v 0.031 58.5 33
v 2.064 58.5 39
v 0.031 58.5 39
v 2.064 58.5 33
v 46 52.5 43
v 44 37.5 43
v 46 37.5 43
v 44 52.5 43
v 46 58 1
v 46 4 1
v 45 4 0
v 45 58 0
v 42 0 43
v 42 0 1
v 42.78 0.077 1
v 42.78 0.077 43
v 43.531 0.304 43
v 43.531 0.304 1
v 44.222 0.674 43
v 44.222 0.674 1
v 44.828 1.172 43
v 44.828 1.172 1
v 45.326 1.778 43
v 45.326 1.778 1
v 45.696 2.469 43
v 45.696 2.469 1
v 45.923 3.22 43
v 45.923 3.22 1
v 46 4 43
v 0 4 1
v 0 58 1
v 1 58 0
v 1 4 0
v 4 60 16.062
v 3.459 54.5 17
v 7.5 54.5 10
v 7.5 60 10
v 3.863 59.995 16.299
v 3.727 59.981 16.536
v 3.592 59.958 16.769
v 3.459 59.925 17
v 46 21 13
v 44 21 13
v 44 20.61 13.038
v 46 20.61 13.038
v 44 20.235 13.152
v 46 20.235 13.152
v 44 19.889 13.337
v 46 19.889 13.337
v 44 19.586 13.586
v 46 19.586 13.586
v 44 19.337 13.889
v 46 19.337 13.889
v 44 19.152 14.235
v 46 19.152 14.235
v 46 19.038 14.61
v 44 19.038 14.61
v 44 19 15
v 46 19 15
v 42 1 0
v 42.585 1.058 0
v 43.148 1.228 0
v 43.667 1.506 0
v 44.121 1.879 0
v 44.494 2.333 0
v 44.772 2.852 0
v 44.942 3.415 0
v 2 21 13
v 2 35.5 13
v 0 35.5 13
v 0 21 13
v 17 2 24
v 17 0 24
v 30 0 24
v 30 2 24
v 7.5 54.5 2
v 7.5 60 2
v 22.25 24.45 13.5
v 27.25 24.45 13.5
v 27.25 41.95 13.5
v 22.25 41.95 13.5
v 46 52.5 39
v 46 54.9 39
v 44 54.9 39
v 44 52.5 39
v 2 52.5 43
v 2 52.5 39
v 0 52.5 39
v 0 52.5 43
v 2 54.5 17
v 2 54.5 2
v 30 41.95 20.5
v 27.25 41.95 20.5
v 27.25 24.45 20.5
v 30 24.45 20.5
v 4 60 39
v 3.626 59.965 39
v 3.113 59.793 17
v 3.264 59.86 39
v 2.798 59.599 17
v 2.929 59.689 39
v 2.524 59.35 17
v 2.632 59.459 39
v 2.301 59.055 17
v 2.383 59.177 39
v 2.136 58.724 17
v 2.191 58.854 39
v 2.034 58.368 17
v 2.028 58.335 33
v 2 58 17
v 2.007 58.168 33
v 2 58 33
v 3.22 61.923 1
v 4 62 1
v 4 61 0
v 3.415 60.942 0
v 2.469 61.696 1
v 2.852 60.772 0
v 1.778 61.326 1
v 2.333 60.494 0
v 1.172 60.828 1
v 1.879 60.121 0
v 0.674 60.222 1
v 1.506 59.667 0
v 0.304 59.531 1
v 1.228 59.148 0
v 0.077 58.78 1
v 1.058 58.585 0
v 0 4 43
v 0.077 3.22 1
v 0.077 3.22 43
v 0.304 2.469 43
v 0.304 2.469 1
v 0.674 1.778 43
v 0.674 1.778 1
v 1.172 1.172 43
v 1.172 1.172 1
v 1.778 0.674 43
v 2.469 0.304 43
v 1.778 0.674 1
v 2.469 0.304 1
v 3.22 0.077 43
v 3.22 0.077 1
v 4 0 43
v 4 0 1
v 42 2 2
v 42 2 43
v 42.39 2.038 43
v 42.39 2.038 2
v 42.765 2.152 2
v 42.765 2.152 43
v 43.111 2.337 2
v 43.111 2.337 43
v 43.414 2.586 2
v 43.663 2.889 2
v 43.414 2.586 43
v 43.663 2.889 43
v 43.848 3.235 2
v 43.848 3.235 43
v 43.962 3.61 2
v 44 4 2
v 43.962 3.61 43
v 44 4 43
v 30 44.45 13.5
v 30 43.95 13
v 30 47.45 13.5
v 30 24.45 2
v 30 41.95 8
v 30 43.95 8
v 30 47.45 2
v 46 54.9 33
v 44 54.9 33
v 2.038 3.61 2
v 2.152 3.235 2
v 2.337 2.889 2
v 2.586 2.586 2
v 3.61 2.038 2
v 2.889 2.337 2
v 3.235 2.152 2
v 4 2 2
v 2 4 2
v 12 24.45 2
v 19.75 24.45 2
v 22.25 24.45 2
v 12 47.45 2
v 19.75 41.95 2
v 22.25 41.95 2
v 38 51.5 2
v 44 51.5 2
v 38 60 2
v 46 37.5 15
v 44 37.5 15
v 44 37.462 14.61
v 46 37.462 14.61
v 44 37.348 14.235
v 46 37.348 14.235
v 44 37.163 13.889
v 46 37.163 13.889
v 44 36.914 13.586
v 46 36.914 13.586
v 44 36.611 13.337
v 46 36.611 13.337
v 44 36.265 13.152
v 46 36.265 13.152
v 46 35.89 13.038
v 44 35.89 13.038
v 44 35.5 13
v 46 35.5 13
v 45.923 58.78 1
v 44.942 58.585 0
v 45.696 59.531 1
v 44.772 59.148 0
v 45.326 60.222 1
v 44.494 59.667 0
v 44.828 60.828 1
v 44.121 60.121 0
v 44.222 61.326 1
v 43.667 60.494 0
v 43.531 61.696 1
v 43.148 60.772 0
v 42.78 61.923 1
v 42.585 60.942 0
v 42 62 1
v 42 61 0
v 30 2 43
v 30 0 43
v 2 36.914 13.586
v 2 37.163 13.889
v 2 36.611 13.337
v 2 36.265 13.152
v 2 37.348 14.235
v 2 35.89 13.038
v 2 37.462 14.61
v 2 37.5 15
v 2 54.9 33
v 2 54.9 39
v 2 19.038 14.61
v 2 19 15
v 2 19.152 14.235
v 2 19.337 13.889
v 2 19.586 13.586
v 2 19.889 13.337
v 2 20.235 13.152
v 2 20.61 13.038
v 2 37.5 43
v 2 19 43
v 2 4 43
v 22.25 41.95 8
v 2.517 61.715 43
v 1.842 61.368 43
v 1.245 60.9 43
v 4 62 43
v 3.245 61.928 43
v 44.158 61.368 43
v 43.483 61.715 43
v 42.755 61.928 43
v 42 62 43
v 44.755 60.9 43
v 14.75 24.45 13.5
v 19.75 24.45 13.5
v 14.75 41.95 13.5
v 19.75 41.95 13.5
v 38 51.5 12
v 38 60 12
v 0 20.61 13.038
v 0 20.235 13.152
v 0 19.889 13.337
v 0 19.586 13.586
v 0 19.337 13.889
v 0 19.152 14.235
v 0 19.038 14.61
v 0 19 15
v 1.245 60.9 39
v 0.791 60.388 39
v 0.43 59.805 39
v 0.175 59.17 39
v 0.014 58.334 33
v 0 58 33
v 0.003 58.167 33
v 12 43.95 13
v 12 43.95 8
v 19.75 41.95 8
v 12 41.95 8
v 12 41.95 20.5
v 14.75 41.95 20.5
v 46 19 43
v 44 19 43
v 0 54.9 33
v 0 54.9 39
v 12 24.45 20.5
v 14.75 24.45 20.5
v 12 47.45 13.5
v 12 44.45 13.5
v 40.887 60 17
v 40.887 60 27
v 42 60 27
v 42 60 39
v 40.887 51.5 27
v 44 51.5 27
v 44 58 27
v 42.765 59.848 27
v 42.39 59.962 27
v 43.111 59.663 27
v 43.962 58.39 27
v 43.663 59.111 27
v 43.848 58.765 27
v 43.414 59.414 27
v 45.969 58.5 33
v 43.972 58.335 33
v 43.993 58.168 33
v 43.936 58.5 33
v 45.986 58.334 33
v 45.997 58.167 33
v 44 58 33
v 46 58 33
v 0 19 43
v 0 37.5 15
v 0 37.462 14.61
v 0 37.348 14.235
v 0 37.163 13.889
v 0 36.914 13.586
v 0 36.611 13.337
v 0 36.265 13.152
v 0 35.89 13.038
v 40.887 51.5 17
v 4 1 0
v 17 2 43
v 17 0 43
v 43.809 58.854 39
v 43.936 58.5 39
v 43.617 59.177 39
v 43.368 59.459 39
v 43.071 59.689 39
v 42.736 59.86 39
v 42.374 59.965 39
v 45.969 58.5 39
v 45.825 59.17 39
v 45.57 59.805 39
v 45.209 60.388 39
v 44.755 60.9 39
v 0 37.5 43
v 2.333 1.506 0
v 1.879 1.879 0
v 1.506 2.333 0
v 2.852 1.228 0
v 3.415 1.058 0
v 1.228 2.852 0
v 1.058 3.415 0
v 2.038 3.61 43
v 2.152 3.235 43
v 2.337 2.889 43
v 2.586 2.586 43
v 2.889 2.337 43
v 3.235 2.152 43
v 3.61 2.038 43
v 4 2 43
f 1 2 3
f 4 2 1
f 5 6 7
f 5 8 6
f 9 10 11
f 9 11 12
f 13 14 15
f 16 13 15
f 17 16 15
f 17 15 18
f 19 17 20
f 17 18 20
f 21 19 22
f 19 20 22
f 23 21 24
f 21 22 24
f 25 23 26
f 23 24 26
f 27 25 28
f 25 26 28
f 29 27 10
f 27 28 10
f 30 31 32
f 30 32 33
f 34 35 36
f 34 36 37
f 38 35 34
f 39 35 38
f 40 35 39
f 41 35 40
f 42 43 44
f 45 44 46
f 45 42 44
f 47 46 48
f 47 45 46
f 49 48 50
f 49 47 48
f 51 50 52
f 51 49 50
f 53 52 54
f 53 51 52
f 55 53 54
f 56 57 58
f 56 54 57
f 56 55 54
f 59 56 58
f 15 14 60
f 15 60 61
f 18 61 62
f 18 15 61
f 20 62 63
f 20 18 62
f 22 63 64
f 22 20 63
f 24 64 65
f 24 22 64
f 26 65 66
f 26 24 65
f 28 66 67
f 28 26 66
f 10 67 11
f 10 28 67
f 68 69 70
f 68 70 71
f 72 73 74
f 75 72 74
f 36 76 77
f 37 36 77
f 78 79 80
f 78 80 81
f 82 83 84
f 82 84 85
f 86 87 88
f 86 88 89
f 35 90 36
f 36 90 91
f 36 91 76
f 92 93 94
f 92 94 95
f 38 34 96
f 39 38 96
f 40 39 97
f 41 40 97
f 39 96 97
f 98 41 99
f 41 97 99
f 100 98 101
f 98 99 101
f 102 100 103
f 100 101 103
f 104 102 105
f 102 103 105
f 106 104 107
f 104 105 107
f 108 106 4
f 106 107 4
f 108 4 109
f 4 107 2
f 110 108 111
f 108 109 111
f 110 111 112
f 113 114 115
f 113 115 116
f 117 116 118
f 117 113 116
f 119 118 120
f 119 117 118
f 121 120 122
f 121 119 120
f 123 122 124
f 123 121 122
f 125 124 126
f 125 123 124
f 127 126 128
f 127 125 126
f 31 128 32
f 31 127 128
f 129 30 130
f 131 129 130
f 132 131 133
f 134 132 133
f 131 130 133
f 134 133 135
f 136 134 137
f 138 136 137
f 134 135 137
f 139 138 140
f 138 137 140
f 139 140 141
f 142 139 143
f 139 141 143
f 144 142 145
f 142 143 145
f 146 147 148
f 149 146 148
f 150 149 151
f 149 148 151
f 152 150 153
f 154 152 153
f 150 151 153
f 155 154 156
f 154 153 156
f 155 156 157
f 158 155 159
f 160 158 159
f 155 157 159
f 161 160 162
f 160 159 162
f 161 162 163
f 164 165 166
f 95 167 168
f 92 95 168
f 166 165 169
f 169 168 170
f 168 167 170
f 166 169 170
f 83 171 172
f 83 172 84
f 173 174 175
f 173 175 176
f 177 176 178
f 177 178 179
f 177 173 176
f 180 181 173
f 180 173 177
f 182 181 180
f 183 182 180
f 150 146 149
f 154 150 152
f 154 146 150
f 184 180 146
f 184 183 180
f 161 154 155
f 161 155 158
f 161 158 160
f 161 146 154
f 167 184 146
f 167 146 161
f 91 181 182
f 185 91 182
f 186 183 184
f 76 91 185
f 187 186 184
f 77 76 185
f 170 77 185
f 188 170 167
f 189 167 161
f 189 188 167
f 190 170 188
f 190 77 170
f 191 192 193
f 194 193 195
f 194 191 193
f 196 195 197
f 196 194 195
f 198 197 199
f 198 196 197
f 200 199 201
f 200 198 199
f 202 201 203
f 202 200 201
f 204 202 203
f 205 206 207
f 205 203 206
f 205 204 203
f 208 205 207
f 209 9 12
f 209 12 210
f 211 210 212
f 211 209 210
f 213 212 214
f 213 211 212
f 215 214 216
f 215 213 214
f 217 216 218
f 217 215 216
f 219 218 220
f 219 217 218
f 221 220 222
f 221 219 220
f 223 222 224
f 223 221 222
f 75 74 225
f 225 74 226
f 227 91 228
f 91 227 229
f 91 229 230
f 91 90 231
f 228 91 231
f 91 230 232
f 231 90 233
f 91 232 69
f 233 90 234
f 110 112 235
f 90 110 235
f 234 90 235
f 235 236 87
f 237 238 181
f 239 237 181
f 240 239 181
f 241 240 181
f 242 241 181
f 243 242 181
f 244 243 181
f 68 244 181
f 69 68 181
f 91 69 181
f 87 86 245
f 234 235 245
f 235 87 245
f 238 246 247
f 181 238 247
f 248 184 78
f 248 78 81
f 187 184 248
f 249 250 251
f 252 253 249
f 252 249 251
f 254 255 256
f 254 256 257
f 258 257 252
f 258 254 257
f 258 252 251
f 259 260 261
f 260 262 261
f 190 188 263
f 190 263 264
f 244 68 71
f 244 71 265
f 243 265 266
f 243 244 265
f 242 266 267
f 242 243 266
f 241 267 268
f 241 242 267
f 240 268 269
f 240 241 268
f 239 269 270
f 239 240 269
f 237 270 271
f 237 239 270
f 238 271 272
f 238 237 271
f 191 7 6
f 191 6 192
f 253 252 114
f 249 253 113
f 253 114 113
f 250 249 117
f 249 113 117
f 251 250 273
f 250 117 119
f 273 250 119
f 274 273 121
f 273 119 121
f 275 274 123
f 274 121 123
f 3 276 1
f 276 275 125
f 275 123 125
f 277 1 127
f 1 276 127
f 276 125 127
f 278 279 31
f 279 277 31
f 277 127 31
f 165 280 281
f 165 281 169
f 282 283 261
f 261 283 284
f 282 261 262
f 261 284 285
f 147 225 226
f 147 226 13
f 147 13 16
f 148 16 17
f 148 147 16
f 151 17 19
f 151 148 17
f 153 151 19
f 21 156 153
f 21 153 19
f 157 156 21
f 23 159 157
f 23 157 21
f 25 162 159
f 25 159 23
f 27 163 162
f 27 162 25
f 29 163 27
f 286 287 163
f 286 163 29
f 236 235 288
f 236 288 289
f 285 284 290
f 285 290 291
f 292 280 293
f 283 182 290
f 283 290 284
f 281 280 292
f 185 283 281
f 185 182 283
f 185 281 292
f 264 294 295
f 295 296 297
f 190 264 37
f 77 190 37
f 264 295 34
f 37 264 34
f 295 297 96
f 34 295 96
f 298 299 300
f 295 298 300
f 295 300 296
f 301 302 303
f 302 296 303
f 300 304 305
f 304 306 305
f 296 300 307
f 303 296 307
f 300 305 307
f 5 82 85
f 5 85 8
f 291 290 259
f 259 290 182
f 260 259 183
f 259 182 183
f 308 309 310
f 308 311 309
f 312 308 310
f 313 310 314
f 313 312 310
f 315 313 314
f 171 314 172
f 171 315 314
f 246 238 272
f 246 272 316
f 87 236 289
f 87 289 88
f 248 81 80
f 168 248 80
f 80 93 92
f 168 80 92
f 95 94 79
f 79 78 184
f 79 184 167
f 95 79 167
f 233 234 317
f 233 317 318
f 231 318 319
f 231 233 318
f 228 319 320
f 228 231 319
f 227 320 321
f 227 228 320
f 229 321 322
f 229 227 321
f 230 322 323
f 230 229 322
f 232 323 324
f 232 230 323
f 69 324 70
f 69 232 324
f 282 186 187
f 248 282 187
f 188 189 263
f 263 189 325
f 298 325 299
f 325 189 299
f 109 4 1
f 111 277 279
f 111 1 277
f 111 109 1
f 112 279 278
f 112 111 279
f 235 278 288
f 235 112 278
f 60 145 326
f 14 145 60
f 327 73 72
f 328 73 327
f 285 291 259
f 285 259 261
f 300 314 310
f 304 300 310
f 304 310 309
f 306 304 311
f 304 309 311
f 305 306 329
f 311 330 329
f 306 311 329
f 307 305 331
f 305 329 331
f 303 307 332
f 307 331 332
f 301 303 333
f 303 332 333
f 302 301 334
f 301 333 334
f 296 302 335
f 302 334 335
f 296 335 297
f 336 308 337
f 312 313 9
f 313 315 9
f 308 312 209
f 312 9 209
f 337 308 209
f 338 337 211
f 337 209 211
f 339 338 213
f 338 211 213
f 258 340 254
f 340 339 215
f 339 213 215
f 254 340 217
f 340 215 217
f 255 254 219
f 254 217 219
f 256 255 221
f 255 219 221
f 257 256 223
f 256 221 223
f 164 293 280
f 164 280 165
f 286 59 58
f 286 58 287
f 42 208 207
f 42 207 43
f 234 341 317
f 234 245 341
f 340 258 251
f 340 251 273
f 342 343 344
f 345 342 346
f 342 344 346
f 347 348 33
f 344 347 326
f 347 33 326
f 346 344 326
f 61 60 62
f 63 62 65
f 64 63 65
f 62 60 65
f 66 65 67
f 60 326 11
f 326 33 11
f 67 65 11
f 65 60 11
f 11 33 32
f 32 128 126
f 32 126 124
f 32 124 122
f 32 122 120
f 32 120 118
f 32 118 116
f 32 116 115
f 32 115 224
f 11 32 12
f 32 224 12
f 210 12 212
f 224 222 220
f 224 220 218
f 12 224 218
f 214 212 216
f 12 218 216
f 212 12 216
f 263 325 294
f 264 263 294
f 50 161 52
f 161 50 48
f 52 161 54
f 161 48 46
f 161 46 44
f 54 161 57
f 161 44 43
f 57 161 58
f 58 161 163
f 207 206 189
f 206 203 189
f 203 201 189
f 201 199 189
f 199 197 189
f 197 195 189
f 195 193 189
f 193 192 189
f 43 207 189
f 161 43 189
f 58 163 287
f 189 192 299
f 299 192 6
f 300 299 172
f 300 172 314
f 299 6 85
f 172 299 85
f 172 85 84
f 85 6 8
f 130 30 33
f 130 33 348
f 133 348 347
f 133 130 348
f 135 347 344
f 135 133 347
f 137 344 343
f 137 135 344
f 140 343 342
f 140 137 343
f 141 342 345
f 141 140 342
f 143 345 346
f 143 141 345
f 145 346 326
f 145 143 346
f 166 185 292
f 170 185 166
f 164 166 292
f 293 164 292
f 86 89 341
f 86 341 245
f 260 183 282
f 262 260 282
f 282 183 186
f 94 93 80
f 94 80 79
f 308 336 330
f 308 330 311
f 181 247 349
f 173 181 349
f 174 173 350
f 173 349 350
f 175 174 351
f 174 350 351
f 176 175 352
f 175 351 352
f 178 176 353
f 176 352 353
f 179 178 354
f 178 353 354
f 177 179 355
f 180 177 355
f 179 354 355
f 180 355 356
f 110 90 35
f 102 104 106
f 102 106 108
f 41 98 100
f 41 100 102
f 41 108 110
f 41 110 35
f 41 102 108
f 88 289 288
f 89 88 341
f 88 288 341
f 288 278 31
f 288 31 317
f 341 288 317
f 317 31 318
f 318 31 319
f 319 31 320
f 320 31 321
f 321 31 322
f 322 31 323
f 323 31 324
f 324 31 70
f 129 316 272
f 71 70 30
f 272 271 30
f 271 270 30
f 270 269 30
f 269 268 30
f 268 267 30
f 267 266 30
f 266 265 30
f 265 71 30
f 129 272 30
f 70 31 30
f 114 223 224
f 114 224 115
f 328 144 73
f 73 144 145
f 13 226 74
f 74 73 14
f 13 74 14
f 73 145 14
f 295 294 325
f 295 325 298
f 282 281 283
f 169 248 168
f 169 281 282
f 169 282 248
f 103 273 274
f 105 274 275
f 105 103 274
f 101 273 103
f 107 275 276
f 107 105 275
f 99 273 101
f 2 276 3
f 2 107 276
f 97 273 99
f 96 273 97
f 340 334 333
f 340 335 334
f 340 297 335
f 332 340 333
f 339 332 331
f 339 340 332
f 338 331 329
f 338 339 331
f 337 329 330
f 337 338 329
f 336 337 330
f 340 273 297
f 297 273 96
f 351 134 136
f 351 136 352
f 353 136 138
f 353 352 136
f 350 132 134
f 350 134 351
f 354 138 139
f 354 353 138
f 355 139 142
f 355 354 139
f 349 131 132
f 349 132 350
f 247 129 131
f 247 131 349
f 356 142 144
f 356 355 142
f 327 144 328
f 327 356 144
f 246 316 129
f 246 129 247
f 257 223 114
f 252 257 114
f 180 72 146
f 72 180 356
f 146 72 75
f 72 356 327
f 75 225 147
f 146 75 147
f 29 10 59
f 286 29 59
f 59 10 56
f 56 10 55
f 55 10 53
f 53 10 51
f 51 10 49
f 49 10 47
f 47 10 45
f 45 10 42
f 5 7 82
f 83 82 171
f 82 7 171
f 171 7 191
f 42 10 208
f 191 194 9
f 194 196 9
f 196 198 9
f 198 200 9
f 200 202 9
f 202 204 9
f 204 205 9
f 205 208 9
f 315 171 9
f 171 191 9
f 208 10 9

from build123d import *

# Parameters (mm, degrees)
BOSS_EXTRU_1_DEPTH      = 43
ENL_V_MAT_EXTRU_1_DEPTH = 41
ENL_V_MAT_EXTRU_2_DEPTH = 89.36854644
CHANFREIN1_SIZE         = 1
ENL_V_MAT_EXTRU_3_DEPTH = 89.36854644
ESQUISSE6_W             = 18
ESQUISSE6_H             = 23
BOSS_EXTRU_2_DEPTH      = 18.5
ENL_V_MAT_EXTRU_4_DEPTH = 7
ESQUISSE8_W             = 18
ESQUISSE8_H             = 2
ENL_V_MAT_EXTRU_5_DEPTH = 5.5
ESQUISSE9_W             = 13
ESQUISSE9_H             = 19
ENL_V_MAT_EXTRU_6_DEPTH = 3
CHANFREIN2_SIZE         = 0.5
ENL_V_START             = -11.5
ESQUISSE14_W            = 2.5
ESQUISSE14_H            = 17.5
ENL_V_MAT_EXTRU_7_DEPTH = 11.5
ESQUISSE15_W            = 5.5
ESQUISSE15_H            = 5.5
ESQUISSE15_W_2          = 6
ESQUISSE15_H_2          = 8.5
BOSS_EXTRU_4_DEPTH      = 15
CHANFREIN3_SIZE         = 7
CHANFREIN3_SIZE2        = 4.041451884
CHANFREIN4_SIZE         = 5
CHANFREIN4_SIZE2        = 2.886751346
ESQUISSE16_W            = 10
ESQUISSE16_H            = 8.5
BOSS_EXTRU_5_DEPTH      = 3.11325


with BuildPart() as part:
    # Esquisse1 → Boss.-Extru.1 (new body)
    with BuildSketch(Plane.XY):
        with BuildLine():
            Line((4, 0), (42, 0))
            ThreePointArc((42, 0), (44.828427125, 1.171572875), (46, 4))
            Line((46, 4), (46, 58))
            ThreePointArc((46, 58), (44.828427125, 60.828427125), (42, 62))
            Line((42, 62), (4, 62))
            ThreePointArc((4, 62), (1.171572875, 60.828427125), (0, 58))
            Line((0, 58), (0, 4))
            ThreePointArc((0, 4), (1.171572875, 1.171572875), (4, 0))
        make_face()
    extrude(amount=BOSS_EXTRU_1_DEPTH)

    # Esquisse3 → Enlèv. mat.-Extru.1 (cut)
    with BuildSketch(Plane.XY.offset(43)):
        with BuildLine():
            Line((2, 58), (2, 4))
            ThreePointArc((2, 4), (2.585786438, 2.585786438), (4, 2))
            Line((4, 2), (42, 2))
            ThreePointArc((42, 2), (43.414213562, 2.585786438), (44, 4))
            Line((44, 4), (44, 58))
            ThreePointArc((44, 58), (43.414213562, 59.414213562), (42, 60))
            Line((42, 60), (4, 60))
            ThreePointArc((4, 60), (2.585786438, 59.414213562), (2, 58))
        make_face()
    extrude(amount=-ENL_V_MAT_EXTRU_1_DEPTH, mode=Mode.SUBTRACT)

    # Esquisse4 → Enlèv. mat.-Extru.2 (cut, through all)
    with BuildSketch(Plane(origin=(46, 0, 0), x_dir=(0, 0, -1), z_dir=(1, 0, 0))):
        Polygon((-58.508519511, 60.9), (-39, 60.9), (-39, 58.5), (-33, 58.5), (-33, 54.9), (-39, 54.9), (-39, 52.5), (-58.508519511, 52.5), align=None)
    extrude(amount=-ENL_V_MAT_EXTRU_2_DEPTH, mode=Mode.SUBTRACT)

    # Chanfrein1
    chanfrein1_edges = [part.edges().sort_by_distance(p)[0] for p in [
        (46, 31, 0),
        (44.828427125, 1.171572875, 0),
        (23, 0, 0),
        (1.171572875, 1.171572875, 0),
        (0, 31, 0),
        (1.171572875, 60.828427125, 0),
        (23, 62, 0),
        (44.828427125, 60.828427125, 0),
    ]]
    chamfer(chanfrein1_edges, length=CHANFREIN1_SIZE)

    # Esquisse5 → Enlèv. mat.-Extru.3 (cut, through all)
    with BuildSketch(Plane(origin=(46, 0, 0), x_dir=(0, 0, -1), z_dir=(1, 0, 0))):
        with BuildLine():
            Line((-61.896917985, 37.5), (-15, 37.5))
            ThreePointArc((-15, 37.5), (-13.585786438, 36.914213562), (-13, 35.5))
            Line((-13, 35.5), (-13, 21))
            ThreePointArc((-13, 21), (-13.585786438, 19.585786438), (-15, 19))
            Line((-15, 19), (-61.896917985, 19))
            Line((-61.896917985, 19), (-61.896917985, 37.5))
        make_face()
    extrude(amount=-ENL_V_MAT_EXTRU_3_DEPTH, mode=Mode.SUBTRACT)

    # Esquisse6 → Boss.-Extru.2 (add)
    with BuildSketch(Plane.XY.offset(2)):
        with Locations((21, 35.95)):
            Rectangle(ESQUISSE6_W, ESQUISSE6_H)
    extrude(amount=BOSS_EXTRU_2_DEPTH)

    # Esquisse7 → Enlèv. mat.-Extru.4 (cut)
    with BuildSketch(Plane.XY.offset(20.5)):
        Polygon((12, 41.95), (12, 47.45), (30, 47.45), (30, 41.95), (27.25, 41.95), (27.25, 24.45), (14.75, 24.45), (14.75, 41.95), align=None)
    extrude(amount=-ENL_V_MAT_EXTRU_4_DEPTH, mode=Mode.SUBTRACT)

    # Esquisse8 → Enlèv. mat.-Extru.5 (cut)
    with BuildSketch(Plane.XY.offset(13.5)):
        with Locations((21, 42.95)):
            Rectangle(ESQUISSE8_W, ESQUISSE8_H)
    extrude(amount=-ENL_V_MAT_EXTRU_5_DEPTH, mode=Mode.SUBTRACT)

    # Esquisse9 → Enlèv. mat.-Extru.6 (cut)
    with BuildSketch(Plane.XZ):
        with Locations((23.5, 33.5)):
            Rectangle(ESQUISSE9_W, ESQUISSE9_H)
    extrude(amount=-ENL_V_MAT_EXTRU_6_DEPTH, mode=Mode.SUBTRACT)

    # Chanfrein2
    chanfrein2_edges = [part.edges().sort_by_distance(p)[0] for p in [
        (21, 43.95, 13.5),
    ]]
    chamfer(chanfrein2_edges, length=CHANFREIN2_SIZE)

    # Esquisse14 → Enlèv. mat.-Extru.7 (cut)
    with BuildSketch(Plane.XY.offset(13.5).offset(ENL_V_START)):
        with Locations((21, 33.2)):
            Rectangle(ESQUISSE14_W, ESQUISSE14_H)
    extrude(amount=ENL_V_MAT_EXTRU_7_DEPTH, mode=Mode.SUBTRACT)

    # Esquisse15 → Boss.-Extru.4 (add)
    with BuildSketch(Plane.XY.offset(2)):
        with Locations((4.75, 57.25)):
            Rectangle(ESQUISSE15_W, ESQUISSE15_H)
        with Locations((41, 55.75)):
            Rectangle(ESQUISSE15_W_2, ESQUISSE15_H_2)
    extrude(amount=BOSS_EXTRU_4_DEPTH)

    # Chanfrein3
    chanfrein3_edges = [part.edges().sort_by_distance(p)[0] for p in [
        (7.5, 57.25, 17),
    ]]
    chanfrein3_side = [part.faces().sort_by_distance(p)[0] for p in [
        (7.5, 57.25, 9.5),
    ]]
    chamfer(chanfrein3_edges, length=CHANFREIN3_SIZE, length2=CHANFREIN3_SIZE2, reference=chanfrein3_side[0])

    # Chanfrein4
    chanfrein4_edges = [part.edges().sort_by_distance(p)[0] for p in [
        (38, 55.75, 17),
    ]]
    chanfrein4_side = [part.faces().sort_by_distance(p)[0] for p in [
        (38, 55.75, 9.5),
    ]]
    chamfer(chanfrein4_edges, length=CHANFREIN4_SIZE, length2=CHANFREIN4_SIZE2, reference=chanfrein4_side[0])

    # Esquisse16 → Boss.-Extru.5 (add)
    with BuildSketch(Plane.ZY.offset(-44)):
        with Locations((22, 55.75)):
            Rectangle(ESQUISSE16_W, ESQUISSE16_H)
    extrude(amount=BOSS_EXTRU_5_DEPTH)


solid = part.part
